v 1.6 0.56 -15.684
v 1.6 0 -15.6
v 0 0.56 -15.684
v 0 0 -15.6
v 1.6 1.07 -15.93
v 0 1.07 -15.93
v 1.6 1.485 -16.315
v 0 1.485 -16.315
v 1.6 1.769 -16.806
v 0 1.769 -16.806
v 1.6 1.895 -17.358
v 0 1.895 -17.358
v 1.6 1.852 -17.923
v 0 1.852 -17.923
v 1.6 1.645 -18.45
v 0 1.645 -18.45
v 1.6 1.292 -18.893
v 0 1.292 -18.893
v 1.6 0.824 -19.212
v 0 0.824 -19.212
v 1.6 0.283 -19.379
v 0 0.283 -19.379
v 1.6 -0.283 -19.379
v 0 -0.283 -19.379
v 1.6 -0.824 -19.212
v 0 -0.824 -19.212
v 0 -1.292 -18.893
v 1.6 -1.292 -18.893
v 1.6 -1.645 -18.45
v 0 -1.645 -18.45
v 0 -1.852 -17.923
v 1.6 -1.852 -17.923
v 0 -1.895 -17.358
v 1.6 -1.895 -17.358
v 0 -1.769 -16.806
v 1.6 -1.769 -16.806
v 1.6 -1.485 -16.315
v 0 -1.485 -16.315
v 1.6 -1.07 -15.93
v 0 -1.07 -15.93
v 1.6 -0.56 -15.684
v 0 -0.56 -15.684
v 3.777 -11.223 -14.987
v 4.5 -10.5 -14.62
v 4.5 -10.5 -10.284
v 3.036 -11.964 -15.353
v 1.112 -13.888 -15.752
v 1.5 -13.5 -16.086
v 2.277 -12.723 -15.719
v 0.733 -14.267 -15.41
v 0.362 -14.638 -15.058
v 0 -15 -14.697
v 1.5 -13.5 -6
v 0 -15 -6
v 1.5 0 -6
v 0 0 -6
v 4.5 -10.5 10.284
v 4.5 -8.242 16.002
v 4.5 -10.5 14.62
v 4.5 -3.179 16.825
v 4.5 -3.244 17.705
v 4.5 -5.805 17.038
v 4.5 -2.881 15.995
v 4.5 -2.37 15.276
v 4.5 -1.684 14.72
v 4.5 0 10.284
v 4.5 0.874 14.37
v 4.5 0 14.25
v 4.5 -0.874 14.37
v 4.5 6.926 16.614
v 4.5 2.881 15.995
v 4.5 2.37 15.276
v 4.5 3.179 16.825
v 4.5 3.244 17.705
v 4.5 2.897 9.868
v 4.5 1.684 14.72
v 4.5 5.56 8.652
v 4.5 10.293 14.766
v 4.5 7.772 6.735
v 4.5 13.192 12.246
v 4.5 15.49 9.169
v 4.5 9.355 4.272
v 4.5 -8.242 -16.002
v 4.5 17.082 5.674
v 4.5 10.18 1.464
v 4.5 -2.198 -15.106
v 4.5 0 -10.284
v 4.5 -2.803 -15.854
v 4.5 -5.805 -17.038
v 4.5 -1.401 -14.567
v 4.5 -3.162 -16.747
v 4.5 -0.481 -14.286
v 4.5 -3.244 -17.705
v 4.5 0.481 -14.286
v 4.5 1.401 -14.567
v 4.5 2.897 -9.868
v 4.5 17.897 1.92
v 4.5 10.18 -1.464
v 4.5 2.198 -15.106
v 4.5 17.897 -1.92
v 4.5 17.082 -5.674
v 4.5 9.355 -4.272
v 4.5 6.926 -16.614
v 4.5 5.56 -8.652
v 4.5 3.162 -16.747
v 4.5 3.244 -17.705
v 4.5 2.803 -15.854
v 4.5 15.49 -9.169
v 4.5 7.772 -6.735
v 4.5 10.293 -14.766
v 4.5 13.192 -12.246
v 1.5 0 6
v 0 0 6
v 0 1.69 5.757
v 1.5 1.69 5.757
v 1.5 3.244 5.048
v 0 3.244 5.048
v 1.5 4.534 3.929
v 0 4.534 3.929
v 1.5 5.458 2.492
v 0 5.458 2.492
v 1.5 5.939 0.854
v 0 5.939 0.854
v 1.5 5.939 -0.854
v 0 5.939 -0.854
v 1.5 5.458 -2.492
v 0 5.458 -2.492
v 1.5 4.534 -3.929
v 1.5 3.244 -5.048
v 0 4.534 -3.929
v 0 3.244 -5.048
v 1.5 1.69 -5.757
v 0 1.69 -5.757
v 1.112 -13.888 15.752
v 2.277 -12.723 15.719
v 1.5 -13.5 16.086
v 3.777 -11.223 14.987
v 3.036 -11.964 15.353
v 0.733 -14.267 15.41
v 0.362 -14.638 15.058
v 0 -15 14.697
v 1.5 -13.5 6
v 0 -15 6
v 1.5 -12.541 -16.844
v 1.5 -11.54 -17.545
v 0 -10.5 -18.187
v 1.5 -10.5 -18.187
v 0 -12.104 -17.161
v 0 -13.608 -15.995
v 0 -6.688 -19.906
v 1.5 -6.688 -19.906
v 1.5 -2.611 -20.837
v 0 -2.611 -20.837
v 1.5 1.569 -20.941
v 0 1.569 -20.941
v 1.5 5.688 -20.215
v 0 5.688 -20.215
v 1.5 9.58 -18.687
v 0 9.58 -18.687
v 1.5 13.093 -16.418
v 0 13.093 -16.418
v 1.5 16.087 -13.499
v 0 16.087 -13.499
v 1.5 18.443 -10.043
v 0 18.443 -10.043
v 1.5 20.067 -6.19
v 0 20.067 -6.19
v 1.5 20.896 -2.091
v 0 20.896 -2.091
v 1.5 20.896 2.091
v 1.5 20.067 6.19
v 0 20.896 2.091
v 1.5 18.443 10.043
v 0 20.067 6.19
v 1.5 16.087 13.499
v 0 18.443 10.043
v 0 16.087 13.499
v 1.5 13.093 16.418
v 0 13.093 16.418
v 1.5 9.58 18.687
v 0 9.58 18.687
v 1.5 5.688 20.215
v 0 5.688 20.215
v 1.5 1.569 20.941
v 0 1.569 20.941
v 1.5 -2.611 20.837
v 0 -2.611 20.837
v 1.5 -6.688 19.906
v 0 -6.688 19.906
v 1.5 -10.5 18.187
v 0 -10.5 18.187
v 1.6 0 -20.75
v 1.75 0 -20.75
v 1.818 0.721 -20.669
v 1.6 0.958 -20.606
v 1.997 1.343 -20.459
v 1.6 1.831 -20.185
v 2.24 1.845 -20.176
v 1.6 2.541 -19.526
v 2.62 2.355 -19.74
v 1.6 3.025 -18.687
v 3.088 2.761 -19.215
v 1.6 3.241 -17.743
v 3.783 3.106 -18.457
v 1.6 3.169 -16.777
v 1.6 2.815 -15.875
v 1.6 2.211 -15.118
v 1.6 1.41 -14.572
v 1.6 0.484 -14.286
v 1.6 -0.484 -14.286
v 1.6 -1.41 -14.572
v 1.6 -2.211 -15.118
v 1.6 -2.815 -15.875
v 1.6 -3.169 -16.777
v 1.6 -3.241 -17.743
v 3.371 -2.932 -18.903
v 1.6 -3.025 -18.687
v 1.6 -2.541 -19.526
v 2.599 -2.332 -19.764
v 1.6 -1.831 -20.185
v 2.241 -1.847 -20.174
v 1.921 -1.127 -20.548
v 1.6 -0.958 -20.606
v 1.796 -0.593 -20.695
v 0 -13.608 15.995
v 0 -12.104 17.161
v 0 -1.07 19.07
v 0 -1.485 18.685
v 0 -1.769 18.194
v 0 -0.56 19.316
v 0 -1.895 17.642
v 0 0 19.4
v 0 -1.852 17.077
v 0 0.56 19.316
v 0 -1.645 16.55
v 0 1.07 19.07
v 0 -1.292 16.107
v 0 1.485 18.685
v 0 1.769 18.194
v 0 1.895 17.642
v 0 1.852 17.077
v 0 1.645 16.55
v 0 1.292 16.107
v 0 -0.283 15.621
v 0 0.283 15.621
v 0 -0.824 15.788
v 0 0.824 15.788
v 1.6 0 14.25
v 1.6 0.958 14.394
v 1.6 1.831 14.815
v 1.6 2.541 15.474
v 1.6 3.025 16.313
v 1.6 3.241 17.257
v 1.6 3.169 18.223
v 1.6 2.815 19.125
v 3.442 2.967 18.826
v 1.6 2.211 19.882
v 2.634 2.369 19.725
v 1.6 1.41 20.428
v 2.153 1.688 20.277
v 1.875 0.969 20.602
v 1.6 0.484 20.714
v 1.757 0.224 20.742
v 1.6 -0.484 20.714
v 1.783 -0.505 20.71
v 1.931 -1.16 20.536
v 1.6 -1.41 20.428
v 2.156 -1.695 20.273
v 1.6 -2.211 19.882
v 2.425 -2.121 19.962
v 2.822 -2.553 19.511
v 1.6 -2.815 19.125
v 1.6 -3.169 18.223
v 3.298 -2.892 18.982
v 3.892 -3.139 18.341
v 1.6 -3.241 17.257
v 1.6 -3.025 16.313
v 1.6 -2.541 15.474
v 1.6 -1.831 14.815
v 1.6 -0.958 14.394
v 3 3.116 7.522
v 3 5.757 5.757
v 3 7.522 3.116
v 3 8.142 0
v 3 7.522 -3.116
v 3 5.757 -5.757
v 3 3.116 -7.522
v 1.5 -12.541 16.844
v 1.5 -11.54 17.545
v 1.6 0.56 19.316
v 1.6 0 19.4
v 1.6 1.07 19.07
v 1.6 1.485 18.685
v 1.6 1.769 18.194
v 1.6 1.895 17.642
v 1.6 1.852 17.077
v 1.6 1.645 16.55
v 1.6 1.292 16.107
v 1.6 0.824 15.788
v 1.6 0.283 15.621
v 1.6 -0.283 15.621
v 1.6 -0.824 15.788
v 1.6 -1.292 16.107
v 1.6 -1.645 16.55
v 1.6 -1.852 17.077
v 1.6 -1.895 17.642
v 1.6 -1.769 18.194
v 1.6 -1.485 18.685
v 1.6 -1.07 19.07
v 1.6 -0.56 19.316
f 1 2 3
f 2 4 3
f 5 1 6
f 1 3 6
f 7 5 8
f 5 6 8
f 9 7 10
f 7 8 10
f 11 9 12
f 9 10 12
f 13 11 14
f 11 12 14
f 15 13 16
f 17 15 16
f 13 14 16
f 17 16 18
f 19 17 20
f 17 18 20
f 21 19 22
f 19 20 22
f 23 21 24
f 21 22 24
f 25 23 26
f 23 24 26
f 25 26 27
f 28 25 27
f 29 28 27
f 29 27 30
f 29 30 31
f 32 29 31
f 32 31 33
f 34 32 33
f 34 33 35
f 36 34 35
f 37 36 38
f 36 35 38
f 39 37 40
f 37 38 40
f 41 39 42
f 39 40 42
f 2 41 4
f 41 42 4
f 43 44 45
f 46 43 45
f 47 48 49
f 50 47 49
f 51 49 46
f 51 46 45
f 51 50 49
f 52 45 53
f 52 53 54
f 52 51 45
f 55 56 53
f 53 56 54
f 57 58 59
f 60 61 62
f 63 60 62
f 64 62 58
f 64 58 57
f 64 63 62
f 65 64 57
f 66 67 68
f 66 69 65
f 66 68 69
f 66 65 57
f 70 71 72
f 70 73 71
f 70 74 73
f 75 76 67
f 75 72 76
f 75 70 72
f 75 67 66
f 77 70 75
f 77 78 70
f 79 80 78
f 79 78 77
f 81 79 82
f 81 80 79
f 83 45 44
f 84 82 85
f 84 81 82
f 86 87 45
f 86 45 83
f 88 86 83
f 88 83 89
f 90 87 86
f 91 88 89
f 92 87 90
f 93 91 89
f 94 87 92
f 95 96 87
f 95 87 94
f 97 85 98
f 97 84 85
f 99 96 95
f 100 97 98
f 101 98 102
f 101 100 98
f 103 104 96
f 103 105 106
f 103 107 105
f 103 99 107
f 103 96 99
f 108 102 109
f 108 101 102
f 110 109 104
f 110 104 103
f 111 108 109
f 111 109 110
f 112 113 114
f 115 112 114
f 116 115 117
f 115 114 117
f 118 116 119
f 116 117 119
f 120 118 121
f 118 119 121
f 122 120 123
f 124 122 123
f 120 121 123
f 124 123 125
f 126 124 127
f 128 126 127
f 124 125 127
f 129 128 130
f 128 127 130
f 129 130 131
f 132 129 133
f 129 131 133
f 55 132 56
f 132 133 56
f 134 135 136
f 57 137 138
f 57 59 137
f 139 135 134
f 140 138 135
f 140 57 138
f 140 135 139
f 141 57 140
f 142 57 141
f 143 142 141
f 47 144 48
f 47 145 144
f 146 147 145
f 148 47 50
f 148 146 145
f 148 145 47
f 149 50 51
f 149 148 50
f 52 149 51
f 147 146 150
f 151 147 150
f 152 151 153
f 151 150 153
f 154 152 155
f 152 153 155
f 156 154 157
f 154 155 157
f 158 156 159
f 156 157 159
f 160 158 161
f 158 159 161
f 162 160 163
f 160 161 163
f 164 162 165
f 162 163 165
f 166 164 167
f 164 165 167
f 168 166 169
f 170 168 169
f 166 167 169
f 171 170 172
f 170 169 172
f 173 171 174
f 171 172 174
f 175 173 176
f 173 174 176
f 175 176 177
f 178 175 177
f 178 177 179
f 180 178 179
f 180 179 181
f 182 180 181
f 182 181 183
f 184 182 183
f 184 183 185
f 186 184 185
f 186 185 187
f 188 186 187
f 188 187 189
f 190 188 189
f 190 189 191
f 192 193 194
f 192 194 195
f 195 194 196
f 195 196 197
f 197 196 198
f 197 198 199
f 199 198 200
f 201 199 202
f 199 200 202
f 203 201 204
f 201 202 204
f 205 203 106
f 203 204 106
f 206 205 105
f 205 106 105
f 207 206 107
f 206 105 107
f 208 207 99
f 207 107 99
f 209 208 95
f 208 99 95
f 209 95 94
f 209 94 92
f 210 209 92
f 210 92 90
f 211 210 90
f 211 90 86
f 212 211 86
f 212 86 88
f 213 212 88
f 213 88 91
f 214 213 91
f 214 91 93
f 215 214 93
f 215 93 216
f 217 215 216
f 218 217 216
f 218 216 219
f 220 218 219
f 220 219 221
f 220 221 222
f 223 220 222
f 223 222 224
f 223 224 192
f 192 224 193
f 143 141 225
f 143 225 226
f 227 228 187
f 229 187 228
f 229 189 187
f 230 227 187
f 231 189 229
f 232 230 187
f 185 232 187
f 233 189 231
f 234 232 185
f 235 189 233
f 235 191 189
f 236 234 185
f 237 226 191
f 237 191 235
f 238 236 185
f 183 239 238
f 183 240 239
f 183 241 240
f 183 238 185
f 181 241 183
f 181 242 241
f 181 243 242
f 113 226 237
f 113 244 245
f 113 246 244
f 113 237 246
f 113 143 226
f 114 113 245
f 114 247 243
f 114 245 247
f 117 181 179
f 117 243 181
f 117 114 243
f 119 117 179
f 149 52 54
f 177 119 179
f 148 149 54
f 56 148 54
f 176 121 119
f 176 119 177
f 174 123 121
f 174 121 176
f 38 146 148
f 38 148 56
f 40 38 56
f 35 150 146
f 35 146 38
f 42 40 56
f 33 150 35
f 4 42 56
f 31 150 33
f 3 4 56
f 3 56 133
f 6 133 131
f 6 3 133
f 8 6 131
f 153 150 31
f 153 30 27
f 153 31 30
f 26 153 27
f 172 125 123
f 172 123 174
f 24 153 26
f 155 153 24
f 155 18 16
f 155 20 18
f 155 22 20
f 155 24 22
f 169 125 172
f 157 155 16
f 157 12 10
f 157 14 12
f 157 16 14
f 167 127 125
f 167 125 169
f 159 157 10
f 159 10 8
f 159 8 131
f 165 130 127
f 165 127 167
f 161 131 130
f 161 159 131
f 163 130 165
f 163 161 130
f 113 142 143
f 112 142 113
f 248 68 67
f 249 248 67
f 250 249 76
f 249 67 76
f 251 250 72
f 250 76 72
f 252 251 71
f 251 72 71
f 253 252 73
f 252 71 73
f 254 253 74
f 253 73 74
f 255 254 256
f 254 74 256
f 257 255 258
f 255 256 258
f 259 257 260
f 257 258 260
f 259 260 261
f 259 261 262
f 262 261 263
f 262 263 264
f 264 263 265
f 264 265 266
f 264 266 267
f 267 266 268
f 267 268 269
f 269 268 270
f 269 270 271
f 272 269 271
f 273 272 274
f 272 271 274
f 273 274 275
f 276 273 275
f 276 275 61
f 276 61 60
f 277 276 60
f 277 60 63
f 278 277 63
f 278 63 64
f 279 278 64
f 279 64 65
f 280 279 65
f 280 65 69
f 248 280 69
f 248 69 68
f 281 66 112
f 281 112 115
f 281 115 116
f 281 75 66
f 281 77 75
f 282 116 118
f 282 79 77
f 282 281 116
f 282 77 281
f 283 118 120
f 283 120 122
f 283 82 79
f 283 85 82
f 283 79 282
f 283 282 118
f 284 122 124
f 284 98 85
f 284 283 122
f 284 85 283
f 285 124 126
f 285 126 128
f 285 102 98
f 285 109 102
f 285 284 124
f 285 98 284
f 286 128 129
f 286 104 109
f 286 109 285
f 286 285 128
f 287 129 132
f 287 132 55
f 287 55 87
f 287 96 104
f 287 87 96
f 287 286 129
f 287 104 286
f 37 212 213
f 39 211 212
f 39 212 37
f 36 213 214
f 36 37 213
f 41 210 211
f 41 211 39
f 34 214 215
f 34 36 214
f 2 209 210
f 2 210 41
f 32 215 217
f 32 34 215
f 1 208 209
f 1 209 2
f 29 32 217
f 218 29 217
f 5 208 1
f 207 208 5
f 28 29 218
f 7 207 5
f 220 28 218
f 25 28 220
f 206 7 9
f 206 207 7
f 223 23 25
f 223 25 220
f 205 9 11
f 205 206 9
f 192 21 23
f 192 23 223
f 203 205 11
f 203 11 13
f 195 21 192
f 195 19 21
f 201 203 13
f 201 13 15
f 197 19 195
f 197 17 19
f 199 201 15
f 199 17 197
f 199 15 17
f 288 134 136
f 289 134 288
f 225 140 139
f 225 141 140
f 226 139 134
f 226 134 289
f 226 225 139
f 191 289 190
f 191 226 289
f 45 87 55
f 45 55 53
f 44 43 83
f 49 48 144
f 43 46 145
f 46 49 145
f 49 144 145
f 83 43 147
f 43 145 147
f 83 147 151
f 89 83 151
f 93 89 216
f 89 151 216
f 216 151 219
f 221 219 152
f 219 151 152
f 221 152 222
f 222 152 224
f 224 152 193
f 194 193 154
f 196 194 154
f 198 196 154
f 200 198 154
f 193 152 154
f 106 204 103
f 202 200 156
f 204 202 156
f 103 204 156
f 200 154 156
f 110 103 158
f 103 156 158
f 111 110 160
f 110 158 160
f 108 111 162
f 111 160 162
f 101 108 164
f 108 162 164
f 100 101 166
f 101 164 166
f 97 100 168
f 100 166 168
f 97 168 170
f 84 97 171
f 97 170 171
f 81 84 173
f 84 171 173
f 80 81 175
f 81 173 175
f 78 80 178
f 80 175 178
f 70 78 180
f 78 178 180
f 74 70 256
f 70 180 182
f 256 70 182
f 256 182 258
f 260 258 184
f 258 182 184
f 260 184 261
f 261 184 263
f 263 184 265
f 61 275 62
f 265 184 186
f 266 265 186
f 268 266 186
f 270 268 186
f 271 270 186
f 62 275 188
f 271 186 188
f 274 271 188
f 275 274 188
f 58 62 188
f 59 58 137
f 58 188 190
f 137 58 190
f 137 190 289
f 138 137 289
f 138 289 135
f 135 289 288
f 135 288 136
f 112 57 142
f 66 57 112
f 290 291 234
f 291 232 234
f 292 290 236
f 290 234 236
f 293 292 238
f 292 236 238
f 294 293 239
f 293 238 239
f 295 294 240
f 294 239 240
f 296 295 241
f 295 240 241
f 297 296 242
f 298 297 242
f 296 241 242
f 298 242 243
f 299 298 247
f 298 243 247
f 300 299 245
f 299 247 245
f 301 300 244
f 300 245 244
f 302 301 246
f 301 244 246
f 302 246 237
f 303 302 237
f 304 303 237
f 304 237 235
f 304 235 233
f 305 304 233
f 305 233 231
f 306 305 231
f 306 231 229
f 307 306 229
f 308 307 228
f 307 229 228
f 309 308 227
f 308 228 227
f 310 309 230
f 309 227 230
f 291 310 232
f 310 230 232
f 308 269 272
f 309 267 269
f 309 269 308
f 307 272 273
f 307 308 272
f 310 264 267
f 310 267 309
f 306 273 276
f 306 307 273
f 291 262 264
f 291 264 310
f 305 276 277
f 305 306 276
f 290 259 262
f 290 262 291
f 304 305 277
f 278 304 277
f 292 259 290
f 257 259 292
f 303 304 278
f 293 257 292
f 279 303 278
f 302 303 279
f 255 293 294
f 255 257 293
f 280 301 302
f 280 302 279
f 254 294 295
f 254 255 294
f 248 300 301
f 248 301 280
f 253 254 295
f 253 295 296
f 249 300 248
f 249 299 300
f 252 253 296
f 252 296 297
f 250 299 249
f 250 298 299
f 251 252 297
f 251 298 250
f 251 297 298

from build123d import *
from OCP.BRepFilletAPI import BRepFilletAPI_MakeChamfer

# Parameters (mm, degrees)
BOSS_EXTRUDE1_DEPTH                                 = 4.5
BOSS_EXTRUDE2_REACH                                 = 32.037
BOSS_EXTRUDE2_END_RADIUS                            = 21
BOSS_EXTRUDE2_DIRECTION_2_REACH                     = 32.037
BOSS_EXTRUDE2_DIRECTION_2_END_RADIUS                = 21
CUT_EXTRUDE1_REACH                                  = 32.037
CUT_EXTRUDE1_DIRECTION_2_REACH                      = 32.037
CBORE_FOR_M3_HEX_SOCKET_HEAD_CAP_SCREW1_D           = 3.8
CBORE_FOR_M3_HEX_SOCKET_HEAD_CAP_SCREW1_DEPTH       = 7
CBORE_FOR_M3_HEX_SOCKET_HEAD_CAP_SCREW1_CBORE_D     = 6.5
CBORE_FOR_M3_HEX_SOCKET_HEAD_CAP_SCREW1_CBORE_DEPTH = 2.9
CBORE_FOR_M3_HEX_SOCKET_HEAD_CAP_SCREW1_TIP         = 1.141635176
CHAMFER1_SIZE                                       = 3
CHAMFER1_SIZE2                                      = 4.28444402
CHAMFER2_SIZE                                       = 3


with BuildPart() as part:
    # Sketch1 → Boss-Extrude1 (new body)
    with BuildSketch(Plane(origin=(0, 0, 0), x_dir=(0, 0, -1), z_dir=(1, 0, 0))):
        with BuildLine():
            Line((-6, -10.5), (-6, 0))
            ThreePointArc((-6, 0), (0, 6), (6, 0))
            Line((6, 0), (6, -10.5))
            Line((6, -10.5), (18.186533479, -10.5))
            ThreePointArc((18.186533479, -10.5), (0, 21), (-18.186533479, -10.5))
            Line((-18.186533479, -10.5), (-6, -10.5))
        make_face()
    extrude(amount=BOSS_EXTRUDE1_DEPTH)

    # Boss-Extrude2: up to this cylinder (the profile starts inside it)
    boss_extrude2_end = Plane(origin=(1.5, 0, 0), z_dir=(-1, 0, 0)) * Cylinder(BOSS_EXTRUDE2_END_RADIUS, 107.074, mode=Mode.PRIVATE)
    # Sketch2 → Boss-Extrude2 (add, up to the surface)
    with BuildSketch(Plane.XY, mode=Mode.PRIVATE) as boss_extrude2_sk1:
        Polygon((4.5, -10.5), (0, -15), (0, -10.5), align=None)
    boss_extrude2_tool1 = extrude(boss_extrude2_sk1.sketch, amount=-BOSS_EXTRUDE2_REACH, mode=Mode.PRIVATE) & boss_extrude2_end
    add(boss_extrude2_tool1.solids().sort_by_distance((1.5, -12, 0))[0])

    # Boss-Extrude2 direction 2: up to this cylinder (the profile starts inside it)
    boss_extrude2_direction_2_end = Plane(origin=(1.5, 0, 0), z_dir=(-1, 0, 0)) * Cylinder(BOSS_EXTRUDE2_DIRECTION_2_END_RADIUS, 107.074, mode=Mode.PRIVATE)
    # Sketch2 → Boss-Extrude2 direction 2 (add, up to the surface)
    with BuildSketch(Plane.XY, mode=Mode.PRIVATE) as boss_extrude2_direction_2_sk1:
        Polygon((4.5, -10.5), (0, -15), (0, -10.5), align=None)
    boss_extrude2_direction_2_tool1 = extrude(boss_extrude2_direction_2_sk1.sketch, amount=BOSS_EXTRUDE2_DIRECTION_2_REACH, mode=Mode.PRIVATE) & boss_extrude2_direction_2_end
    add(boss_extrude2_direction_2_tool1.solids().sort_by_distance((1.5, -12, 0))[0])

    # Cut-Extrude1: up to this face of the body (flat: up to its plane)
    cut_extrude1_end = Plane(part.part.faces().sort_by_distance((2.25, -5.25, -6))[0])
    # Sketch2<2> → Cut-Extrude1 (cut, up to the picked face)
    with BuildSketch(Plane.XY, mode=Mode.PRIVATE) as cut_extrude1_sk1:
        Polygon((4.5, -10.5), (0, -15), (0, -10.5), align=None)
    cut_extrude1_tool1 = split(extrude(cut_extrude1_sk1.sketch, amount=-CUT_EXTRUDE1_REACH, mode=Mode.PRIVATE), bisect_by=cut_extrude1_end, keep=Keep.BOTH, mode=Mode.PRIVATE)
    add(cut_extrude1_tool1.solids().sort_by(Axis((1.5, -12, 0), (0, 0, -1)))[0], mode=Mode.SUBTRACT)

    # Cut-Extrude1 direction 2: up to this face of the body (flat: up to its plane)
    cut_extrude1_direction_2_end = Plane(part.part.faces().sort_by_distance((2.25, -5.25, 6))[0])
    # Sketch2<2> → Cut-Extrude1 direction 2 (cut, up to the picked face)
    with BuildSketch(Plane.XY, mode=Mode.PRIVATE) as cut_extrude1_direction_2_sk1:
        Polygon((4.5, -10.5), (0, -15), (0, -10.5), align=None)
    cut_extrude1_direction_2_tool1 = split(extrude(cut_extrude1_direction_2_sk1.sketch, amount=CUT_EXTRUDE1_DIRECTION_2_REACH, mode=Mode.PRIVATE), bisect_by=cut_extrude1_direction_2_end, keep=Keep.BOTH, mode=Mode.PRIVATE)
    add(cut_extrude1_direction_2_tool1.solids().sort_by(Axis((1.5, -12, 0), (0, 0, 1)))[0], mode=Mode.SUBTRACT)

    # CBORE for M3 Hex Socket Head Cap Screw1
    with Locations(Plane(origin=(4.5, 0, 0), x_dir=(0, 0, -1), z_dir=(1, 0, 0))):
        with Locations((-17.5, 0), (17.5, 0)):
            CounterBoreHole(CBORE_FOR_M3_HEX_SOCKET_HEAD_CAP_SCREW1_D / 2, CBORE_FOR_M3_HEX_SOCKET_HEAD_CAP_SCREW1_CBORE_D / 2, CBORE_FOR_M3_HEX_SOCKET_HEAD_CAP_SCREW1_CBORE_DEPTH, depth=CBORE_FOR_M3_HEX_SOCKET_HEAD_CAP_SCREW1_DEPTH)
            with Locations((0, 0, -(CBORE_FOR_M3_HEX_SOCKET_HEAD_CAP_SCREW1_DEPTH + CBORE_FOR_M3_HEX_SOCKET_HEAD_CAP_SCREW1_TIP / 2))):  # 118° drill point
                Cone(0, CBORE_FOR_M3_HEX_SOCKET_HEAD_CAP_SCREW1_D / 2, CBORE_FOR_M3_HEX_SOCKET_HEAD_CAP_SCREW1_TIP, mode=Mode.SUBTRACT)

    # Chamfer1: one chamfer whose edges measure the first distance from different faces: ONE call of the kernel's chamfer builder (chamfer() names one face for all edges)
    chamfer1_edges_1 = [part.edges().sort_by_distance(p)[0] for p in [
        (4.5, -5.25, 6),
    ]]
    chamfer1_side_1 = [part.faces().sort_by_distance(p)[0] for p in [
        (2.117647059, -6.441176471, 6),
    ]]
    chamfer1_edges_2 = [part.edges().sort_by_distance(p)[0] for p in [
        (4.5, 6, 0),
    ]]
    chamfer1_side_2 = [part.faces().sort_by_distance(p)[0] for p in [
        (2.25, 6, 0),
    ]]
    chamfer1_edges_3 = [part.edges().sort_by_distance(p)[0] for p in [
        (4.5, -5.25, -6),
    ]]
    chamfer1_side_3 = [part.faces().sort_by_distance(p)[0] for p in [
        (2.117647059, -6.441176471, -6),
    ]]
    chamfer1 = BRepFilletAPI_MakeChamfer(part.part.solid().wrapped)
    for e in chamfer1_edges_1:
        chamfer1.Add(CHAMFER1_SIZE, CHAMFER1_SIZE2, e.wrapped, chamfer1_side_1[0].wrapped)  # the first distance lies on this face
    for e in chamfer1_edges_2:
        chamfer1.Add(CHAMFER1_SIZE, CHAMFER1_SIZE2, e.wrapped, chamfer1_side_2[0].wrapped)  # the first distance lies on this face
    for e in chamfer1_edges_3:
        chamfer1.Add(CHAMFER1_SIZE, CHAMFER1_SIZE2, e.wrapped, chamfer1_side_3[0].wrapped)  # the first distance lies on this face
    add(Compound.cast(chamfer1.Shape()), mode=Mode.REPLACE)

    # Chamfer2
    # the kernel refuses this chamfer: 3 mm, written as the material it takes off along each edge
    with BuildSketch(Plane(origin=(4.5, 0, 0), x_dir=(0, -0.7783499423883817, -0.6278306835317966), z_dir=(0, -0.6278306835317966, 0.7783499423883817))) as chamfer2_piece_1:
        Polygon((21 - CHAMFER2_SIZE, 0), (21, -CHAMFER2_SIZE), (21, 0), align=None)
    revolve(axis=Axis((4.5, 0, 0), (1, 0, 0)), revolution_arc=282.219489944, mode=Mode.SUBTRACT)


solid = part.part
